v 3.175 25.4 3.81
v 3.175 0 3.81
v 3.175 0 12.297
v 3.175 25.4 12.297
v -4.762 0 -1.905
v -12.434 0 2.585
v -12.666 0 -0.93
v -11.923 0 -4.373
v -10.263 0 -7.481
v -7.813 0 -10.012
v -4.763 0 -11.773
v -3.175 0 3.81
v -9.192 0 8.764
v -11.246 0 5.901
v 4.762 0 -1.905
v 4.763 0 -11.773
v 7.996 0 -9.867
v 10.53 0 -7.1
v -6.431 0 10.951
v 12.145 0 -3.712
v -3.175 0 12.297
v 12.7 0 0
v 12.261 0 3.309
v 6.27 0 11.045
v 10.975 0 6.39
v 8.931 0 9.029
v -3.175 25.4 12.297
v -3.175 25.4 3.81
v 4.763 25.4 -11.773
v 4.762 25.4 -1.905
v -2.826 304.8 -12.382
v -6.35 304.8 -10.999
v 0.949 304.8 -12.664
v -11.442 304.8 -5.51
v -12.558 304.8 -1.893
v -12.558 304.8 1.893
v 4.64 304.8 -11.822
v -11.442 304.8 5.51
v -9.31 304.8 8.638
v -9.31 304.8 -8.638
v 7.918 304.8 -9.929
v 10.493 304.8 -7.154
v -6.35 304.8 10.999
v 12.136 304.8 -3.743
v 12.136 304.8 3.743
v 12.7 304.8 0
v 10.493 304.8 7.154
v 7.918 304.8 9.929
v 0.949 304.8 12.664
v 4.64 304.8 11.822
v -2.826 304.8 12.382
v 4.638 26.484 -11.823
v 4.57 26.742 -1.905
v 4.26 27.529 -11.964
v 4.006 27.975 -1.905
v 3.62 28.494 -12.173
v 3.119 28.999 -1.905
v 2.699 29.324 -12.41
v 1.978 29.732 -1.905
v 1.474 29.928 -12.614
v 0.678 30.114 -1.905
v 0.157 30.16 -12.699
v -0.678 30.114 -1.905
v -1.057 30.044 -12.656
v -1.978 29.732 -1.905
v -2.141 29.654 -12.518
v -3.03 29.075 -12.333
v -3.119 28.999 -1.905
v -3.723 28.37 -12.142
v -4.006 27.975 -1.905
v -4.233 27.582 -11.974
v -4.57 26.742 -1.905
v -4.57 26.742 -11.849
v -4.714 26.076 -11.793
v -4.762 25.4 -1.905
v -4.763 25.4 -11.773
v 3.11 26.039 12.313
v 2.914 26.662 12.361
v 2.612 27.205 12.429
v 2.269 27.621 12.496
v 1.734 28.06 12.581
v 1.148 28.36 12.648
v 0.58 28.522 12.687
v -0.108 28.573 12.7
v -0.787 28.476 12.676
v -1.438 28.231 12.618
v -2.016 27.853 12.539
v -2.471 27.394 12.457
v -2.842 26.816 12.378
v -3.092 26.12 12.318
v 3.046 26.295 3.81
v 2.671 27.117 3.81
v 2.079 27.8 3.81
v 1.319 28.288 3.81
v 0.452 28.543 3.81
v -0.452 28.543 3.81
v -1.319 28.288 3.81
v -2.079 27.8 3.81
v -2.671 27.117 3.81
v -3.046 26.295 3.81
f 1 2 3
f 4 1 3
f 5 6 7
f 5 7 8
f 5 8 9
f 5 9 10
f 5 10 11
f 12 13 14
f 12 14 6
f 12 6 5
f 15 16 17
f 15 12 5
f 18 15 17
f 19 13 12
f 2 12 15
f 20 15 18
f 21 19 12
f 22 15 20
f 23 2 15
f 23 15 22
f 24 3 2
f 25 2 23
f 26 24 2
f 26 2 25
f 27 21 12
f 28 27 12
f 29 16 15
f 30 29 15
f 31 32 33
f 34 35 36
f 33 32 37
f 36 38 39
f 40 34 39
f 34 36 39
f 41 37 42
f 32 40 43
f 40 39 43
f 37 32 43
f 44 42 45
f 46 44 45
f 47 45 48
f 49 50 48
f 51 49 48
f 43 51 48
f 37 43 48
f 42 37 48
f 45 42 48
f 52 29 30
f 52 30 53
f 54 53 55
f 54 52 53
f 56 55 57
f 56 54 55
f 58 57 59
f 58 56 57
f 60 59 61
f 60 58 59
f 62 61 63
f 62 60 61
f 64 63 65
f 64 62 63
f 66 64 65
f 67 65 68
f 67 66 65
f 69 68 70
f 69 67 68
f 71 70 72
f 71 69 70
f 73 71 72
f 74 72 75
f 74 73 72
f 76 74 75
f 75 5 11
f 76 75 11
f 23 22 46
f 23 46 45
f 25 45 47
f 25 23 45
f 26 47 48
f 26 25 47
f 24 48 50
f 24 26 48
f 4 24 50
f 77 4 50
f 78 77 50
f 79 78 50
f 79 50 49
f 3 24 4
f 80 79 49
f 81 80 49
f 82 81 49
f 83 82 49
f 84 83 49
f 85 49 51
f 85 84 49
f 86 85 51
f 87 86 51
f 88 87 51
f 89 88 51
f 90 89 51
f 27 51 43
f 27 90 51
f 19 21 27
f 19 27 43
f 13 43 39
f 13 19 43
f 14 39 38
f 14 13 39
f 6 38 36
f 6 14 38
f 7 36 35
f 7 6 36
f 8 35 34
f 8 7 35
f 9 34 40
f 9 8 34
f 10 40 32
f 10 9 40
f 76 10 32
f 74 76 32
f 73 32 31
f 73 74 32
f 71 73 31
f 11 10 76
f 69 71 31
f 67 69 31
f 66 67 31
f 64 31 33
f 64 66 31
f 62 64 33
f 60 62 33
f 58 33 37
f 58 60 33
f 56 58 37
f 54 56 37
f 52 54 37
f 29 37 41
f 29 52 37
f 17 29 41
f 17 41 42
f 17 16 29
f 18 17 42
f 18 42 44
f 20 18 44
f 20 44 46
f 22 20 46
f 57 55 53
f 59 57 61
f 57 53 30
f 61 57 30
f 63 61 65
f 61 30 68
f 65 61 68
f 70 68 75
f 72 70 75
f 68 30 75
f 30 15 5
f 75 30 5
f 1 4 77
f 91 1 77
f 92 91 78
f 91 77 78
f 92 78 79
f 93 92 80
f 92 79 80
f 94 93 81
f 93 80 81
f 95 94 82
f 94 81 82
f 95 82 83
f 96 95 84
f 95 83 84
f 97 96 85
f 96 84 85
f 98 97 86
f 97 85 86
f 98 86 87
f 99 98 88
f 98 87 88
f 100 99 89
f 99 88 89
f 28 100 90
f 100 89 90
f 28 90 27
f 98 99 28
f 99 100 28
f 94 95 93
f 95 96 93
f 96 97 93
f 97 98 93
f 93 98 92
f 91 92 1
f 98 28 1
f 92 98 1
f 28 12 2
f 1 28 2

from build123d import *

# Parameters (mm, degrees)
F0_R     = 12.7
F1_DEPTH = 304.8
F3_DEPTH = 25.4
F7_DEPTH = 8.89
F9_DEPTH = 10.795


with BuildPart() as f1:
    # F0 (on Front) → F1 (new body)
    with BuildSketch(Plane.XZ):
        Circle(F0_R)
    extrude(amount=-F1_DEPTH)

    # F2 (on face) → F3 (cut)
    with BuildSketch(Plane.XZ):
        with BuildLine():
            ThreePointArc((3.175, 12.296722), (0, 12.7), (-3.175, 12.296722))
            Line((-3.175, 12.296722), (-3.175, 3.81))
            Line((-3.175, 3.81), (3.175, 3.81))
            Line((3.175, 3.81), (3.175, 12.296722))
        make_face()
        with BuildLine():
            Line((-4.7625, -1.905), (-4.7625, -11.773215))
            ThreePointArc((-4.7625, -11.773215), (0, -12.7), (4.7625, -11.773215))
            Line((4.7625, -11.773215), (4.7625, -1.905))
            Line((4.7625, -1.905), (-4.7625, -1.905))
        make_face()
    extrude(amount=-F3_DEPTH, mode=Mode.SUBTRACT)

    # F6 (on offset) → F7 (cut, through all)
    with BuildSketch(Plane.XY.offset(12.7)):
        with BuildLine():
            Line((-3.175, 25.4), (3.175, 25.4))
            ThreePointArc((3.175, 25.4), (0, 28.575), (-3.175, 25.4))
        make_face()
    extrude(amount=-F7_DEPTH, mode=Mode.SUBTRACT)

    # F8 (on offset) → F9 (cut, through all)
    with BuildSketch(Plane.XY.offset(-12.7)):
        with BuildLine():
            ThreePointArc((4.7625, 25.4), (0, 30.1625), (-4.7625, 25.4))
            Line((-4.7625, 25.4), (4.7625, 25.4))
        make_face()
    extrude(amount=F9_DEPTH, mode=Mode.SUBTRACT)


solid = f1.part
